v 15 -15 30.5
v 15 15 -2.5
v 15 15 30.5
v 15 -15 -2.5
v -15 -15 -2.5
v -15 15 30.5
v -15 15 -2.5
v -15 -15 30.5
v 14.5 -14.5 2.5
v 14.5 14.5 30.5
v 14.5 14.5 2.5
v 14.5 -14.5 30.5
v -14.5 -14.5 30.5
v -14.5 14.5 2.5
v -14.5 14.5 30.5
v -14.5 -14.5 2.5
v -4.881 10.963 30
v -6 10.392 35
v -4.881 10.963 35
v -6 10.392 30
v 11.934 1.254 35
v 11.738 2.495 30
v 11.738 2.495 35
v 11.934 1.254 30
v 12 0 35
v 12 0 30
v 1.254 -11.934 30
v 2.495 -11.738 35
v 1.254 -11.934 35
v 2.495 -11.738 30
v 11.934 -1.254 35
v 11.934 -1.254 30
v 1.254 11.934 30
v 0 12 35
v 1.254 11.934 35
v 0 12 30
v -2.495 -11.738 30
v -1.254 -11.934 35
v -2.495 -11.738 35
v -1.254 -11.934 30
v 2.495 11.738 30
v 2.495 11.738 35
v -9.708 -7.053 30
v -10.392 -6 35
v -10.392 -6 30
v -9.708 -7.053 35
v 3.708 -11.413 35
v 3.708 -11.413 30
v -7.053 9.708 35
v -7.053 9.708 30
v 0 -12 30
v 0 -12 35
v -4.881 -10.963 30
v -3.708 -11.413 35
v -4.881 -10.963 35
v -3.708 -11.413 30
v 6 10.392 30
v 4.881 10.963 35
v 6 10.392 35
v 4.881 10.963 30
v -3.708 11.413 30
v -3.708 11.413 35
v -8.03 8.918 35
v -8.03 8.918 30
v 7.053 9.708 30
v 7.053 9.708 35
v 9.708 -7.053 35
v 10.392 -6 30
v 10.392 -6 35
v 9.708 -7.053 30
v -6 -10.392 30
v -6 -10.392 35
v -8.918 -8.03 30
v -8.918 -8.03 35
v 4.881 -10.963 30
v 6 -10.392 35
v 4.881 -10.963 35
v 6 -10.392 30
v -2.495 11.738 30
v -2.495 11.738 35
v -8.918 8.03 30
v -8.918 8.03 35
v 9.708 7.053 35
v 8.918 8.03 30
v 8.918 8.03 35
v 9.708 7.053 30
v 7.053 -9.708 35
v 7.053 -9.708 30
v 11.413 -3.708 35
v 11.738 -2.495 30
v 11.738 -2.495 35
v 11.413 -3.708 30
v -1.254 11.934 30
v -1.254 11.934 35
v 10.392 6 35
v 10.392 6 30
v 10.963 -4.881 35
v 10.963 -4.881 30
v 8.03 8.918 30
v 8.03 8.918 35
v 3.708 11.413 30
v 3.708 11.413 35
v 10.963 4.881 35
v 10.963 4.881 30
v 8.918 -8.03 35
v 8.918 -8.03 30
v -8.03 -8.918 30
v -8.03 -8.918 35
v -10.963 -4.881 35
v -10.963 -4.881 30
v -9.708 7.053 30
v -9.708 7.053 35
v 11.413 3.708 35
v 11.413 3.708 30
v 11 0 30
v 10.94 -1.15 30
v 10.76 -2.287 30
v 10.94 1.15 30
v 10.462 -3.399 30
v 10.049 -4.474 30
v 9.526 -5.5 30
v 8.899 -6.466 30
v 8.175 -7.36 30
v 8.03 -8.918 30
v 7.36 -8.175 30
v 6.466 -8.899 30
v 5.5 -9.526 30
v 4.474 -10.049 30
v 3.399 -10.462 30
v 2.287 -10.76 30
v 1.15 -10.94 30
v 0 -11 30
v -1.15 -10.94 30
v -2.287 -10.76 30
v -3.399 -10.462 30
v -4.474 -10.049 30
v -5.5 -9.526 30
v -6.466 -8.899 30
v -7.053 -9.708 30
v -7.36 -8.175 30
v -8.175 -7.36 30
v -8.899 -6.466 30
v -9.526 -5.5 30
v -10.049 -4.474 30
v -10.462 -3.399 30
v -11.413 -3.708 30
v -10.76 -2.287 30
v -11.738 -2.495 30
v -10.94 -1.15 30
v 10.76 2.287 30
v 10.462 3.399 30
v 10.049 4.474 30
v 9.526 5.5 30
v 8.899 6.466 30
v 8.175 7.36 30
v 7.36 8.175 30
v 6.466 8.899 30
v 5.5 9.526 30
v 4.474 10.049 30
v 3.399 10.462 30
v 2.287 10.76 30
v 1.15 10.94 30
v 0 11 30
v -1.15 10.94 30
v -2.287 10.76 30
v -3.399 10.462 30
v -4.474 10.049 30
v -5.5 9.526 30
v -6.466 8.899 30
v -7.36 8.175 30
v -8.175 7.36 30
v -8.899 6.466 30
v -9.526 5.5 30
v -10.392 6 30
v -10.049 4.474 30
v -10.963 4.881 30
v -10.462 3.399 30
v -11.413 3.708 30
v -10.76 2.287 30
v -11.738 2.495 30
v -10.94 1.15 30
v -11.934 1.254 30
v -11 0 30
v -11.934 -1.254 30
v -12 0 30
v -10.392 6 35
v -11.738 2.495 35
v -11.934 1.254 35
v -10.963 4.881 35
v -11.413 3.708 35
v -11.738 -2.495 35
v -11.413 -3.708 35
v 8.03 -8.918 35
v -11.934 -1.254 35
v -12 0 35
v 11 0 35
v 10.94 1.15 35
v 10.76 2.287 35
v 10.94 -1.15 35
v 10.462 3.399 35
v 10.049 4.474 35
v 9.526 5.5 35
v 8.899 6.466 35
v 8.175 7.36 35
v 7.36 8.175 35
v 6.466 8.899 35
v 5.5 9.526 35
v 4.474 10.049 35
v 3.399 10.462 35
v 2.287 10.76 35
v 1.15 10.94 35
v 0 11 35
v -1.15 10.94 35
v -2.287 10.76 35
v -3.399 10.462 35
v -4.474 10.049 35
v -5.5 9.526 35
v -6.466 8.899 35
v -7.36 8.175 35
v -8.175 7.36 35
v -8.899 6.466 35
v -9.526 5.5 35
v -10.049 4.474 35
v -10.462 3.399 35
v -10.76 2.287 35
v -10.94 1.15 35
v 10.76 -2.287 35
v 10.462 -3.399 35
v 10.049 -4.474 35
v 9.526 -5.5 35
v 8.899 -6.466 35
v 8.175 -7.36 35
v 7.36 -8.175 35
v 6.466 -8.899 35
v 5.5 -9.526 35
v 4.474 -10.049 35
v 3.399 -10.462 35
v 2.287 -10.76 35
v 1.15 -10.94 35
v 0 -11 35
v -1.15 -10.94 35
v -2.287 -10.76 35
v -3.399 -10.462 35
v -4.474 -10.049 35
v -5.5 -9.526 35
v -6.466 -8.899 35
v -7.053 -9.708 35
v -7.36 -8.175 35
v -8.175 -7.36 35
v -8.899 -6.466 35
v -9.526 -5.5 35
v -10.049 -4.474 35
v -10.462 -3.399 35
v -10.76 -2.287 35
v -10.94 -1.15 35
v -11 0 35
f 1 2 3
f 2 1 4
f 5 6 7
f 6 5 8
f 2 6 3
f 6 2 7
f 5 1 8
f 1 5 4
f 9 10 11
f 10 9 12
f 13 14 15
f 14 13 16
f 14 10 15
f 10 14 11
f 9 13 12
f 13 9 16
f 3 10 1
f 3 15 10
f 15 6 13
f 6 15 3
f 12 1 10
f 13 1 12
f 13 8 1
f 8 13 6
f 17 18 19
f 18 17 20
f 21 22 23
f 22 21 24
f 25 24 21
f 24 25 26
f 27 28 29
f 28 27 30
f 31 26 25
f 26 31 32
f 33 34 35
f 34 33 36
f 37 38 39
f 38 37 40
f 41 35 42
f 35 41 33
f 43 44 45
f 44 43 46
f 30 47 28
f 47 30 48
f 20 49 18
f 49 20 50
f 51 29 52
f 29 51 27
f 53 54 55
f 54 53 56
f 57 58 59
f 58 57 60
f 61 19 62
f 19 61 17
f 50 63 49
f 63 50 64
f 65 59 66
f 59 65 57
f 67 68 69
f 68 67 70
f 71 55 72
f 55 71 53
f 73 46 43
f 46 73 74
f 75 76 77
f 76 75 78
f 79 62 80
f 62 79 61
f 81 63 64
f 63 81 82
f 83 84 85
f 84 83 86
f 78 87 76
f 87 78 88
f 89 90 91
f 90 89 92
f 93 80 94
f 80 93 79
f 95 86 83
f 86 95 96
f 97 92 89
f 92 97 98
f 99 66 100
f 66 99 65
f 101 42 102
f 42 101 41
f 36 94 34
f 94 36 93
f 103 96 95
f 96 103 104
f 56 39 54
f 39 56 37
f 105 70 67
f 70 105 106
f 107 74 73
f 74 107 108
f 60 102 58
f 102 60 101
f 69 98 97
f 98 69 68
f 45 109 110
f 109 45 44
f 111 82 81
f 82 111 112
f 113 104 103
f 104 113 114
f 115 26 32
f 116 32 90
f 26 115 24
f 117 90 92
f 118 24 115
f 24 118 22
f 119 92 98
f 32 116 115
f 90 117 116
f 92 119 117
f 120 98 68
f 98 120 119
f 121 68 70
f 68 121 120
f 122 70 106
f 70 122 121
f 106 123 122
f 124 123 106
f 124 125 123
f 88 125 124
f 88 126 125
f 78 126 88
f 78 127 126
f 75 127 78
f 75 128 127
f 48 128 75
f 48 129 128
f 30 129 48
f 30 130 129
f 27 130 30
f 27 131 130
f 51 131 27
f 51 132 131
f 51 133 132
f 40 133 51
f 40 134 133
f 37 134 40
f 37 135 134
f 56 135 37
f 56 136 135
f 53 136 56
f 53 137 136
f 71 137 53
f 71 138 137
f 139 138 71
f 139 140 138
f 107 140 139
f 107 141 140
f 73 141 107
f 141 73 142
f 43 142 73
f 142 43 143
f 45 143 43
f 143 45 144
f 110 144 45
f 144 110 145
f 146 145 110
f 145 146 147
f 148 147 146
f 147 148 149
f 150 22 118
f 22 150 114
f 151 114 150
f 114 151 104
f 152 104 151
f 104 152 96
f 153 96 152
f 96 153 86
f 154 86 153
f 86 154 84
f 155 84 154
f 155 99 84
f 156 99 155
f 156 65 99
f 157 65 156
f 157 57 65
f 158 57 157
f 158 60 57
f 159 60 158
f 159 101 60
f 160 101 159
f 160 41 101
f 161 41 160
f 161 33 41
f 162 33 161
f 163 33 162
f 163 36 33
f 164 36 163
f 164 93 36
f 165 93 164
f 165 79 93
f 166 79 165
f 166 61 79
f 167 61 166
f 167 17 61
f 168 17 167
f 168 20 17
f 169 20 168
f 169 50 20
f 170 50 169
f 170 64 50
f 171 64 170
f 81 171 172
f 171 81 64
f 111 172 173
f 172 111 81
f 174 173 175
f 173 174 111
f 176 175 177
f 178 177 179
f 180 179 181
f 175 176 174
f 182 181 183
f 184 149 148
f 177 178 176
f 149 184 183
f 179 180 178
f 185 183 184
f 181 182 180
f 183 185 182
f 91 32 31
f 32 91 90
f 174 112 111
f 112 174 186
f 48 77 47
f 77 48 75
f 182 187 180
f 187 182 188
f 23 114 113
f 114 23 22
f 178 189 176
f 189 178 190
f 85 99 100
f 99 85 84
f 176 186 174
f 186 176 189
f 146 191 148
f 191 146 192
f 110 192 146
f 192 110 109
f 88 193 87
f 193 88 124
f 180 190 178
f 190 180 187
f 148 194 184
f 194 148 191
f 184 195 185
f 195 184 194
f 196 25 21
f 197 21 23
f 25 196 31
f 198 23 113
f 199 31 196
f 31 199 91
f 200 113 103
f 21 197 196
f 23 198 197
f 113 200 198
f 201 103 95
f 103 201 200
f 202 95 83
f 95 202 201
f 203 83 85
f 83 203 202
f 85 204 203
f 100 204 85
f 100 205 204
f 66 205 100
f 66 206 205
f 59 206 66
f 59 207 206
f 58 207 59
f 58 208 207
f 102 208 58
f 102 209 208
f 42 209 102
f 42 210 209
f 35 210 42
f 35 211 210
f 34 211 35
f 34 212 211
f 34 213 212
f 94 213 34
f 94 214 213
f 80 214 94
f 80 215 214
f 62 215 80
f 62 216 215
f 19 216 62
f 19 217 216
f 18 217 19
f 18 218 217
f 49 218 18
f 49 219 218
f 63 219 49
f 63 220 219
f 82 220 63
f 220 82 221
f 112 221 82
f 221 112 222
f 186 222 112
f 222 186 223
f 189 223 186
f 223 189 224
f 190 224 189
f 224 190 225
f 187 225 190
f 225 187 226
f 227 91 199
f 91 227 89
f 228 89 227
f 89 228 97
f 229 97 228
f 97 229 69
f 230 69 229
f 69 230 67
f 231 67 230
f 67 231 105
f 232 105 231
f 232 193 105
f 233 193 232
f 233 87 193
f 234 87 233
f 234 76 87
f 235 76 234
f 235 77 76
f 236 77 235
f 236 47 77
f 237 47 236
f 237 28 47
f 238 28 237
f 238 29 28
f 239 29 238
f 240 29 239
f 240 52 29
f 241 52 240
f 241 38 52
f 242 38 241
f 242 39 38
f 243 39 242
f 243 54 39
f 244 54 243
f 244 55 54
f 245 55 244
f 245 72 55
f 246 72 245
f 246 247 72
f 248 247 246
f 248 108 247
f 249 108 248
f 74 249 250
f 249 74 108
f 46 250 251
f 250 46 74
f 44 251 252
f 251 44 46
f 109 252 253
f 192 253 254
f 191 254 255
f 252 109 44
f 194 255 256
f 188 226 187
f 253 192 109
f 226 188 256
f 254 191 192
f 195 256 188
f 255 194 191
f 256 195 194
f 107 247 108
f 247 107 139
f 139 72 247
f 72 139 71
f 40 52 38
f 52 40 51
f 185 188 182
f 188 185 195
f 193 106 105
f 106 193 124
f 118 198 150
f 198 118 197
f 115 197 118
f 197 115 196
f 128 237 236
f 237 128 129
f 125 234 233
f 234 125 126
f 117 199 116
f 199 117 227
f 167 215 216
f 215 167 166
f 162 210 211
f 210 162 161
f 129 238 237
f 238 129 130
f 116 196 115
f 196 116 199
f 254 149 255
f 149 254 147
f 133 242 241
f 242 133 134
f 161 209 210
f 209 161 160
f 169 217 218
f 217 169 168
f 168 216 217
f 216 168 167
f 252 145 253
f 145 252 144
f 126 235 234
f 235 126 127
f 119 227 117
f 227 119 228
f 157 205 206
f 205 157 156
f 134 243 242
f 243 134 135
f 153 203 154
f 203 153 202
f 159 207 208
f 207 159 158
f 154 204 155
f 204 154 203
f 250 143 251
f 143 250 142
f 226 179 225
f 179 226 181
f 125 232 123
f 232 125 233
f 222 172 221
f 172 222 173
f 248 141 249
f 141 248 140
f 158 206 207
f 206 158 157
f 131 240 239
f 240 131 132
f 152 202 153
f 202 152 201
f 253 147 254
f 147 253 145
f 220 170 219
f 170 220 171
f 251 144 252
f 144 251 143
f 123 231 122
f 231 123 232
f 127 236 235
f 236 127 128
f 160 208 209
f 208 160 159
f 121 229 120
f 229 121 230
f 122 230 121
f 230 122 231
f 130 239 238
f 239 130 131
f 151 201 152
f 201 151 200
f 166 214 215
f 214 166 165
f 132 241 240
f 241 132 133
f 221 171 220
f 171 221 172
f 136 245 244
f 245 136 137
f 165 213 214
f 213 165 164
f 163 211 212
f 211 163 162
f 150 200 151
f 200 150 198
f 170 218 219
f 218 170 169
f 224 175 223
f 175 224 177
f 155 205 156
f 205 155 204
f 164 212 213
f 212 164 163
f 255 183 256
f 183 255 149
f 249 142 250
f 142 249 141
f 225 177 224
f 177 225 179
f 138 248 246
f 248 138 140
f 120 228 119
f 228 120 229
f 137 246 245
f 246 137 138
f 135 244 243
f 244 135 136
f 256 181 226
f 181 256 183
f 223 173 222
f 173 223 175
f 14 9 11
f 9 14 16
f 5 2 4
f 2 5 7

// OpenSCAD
/********************************************************************
 * TinkerLib : Square bottle with lid (incomplete)
 * https://github.com/tinkerology/tinkerlib
 * By Scott P Leslie (https://twitter.com/tinkerology)
 * Licensed Under Creative Commons Attributions Share Alike 
 * (http://creativecommons.org/licenses/by-sa/3.0/deed.en_US)
 *******************************************************************/

SIZE=30;
WALL_THICKNESS=1;
HEIGHT=30;
LAYER_THICKNESS=1;
LAYERS=HEIGHT/LAYER_THICKNESS;
TWIST=0;
DETAIL=60;
ELLIPSE=0.750;
BASE_HEIGHT=5;
TOP_HEIGHT=5;
TOP_RADIUS=12;

function profile(index) = SIZE;

module drawShape( height, size1, size2 )
{
	cube([size1,size2,height], center=true);
}


module drawLayer(index)
{
	difference()
	{
		translate([0,0,index*LAYER_THICKNESS])
		drawShape(1,profile(index), profile(index+1), $fn=DETAIL);

		translate([0,0,index*LAYER_THICKNESS])
		drawShape(1.01,profile(index)-WALL_THICKNESS, profile(index+1)-WALL_THICKNESS, $fn=DETAIL);
	}
}

module drawBottom()
{
	cube( [SIZE,SIZE,BASE_HEIGHT], center=true);
}

module drawTopTransition()
{
}

module drawTopThreads()
{
	translate([0,0,HEIGHT+BASE_HEIGHT/2])
	difference()
	{
		cylinder( TOP_HEIGHT, TOP_RADIUS, TOP_RADIUS, center=true, $fn=DETAIL );
		cylinder( TOP_HEIGHT, TOP_RADIUS-WALL_THICKNESS, TOP_RADIUS-WALL_THICKNESS, center=true, $fn=DETAIL );
	}


}

module drawBottle()
{
	drawBottom();

	for ( i = [0 : LAYERS] )
	{
		//rotate([0,0,(TWIST/LAYERS)*i])
		drawLayer(i);
	}

	drawTopTransition();

	drawTopThreads();
}

drawBottle();
